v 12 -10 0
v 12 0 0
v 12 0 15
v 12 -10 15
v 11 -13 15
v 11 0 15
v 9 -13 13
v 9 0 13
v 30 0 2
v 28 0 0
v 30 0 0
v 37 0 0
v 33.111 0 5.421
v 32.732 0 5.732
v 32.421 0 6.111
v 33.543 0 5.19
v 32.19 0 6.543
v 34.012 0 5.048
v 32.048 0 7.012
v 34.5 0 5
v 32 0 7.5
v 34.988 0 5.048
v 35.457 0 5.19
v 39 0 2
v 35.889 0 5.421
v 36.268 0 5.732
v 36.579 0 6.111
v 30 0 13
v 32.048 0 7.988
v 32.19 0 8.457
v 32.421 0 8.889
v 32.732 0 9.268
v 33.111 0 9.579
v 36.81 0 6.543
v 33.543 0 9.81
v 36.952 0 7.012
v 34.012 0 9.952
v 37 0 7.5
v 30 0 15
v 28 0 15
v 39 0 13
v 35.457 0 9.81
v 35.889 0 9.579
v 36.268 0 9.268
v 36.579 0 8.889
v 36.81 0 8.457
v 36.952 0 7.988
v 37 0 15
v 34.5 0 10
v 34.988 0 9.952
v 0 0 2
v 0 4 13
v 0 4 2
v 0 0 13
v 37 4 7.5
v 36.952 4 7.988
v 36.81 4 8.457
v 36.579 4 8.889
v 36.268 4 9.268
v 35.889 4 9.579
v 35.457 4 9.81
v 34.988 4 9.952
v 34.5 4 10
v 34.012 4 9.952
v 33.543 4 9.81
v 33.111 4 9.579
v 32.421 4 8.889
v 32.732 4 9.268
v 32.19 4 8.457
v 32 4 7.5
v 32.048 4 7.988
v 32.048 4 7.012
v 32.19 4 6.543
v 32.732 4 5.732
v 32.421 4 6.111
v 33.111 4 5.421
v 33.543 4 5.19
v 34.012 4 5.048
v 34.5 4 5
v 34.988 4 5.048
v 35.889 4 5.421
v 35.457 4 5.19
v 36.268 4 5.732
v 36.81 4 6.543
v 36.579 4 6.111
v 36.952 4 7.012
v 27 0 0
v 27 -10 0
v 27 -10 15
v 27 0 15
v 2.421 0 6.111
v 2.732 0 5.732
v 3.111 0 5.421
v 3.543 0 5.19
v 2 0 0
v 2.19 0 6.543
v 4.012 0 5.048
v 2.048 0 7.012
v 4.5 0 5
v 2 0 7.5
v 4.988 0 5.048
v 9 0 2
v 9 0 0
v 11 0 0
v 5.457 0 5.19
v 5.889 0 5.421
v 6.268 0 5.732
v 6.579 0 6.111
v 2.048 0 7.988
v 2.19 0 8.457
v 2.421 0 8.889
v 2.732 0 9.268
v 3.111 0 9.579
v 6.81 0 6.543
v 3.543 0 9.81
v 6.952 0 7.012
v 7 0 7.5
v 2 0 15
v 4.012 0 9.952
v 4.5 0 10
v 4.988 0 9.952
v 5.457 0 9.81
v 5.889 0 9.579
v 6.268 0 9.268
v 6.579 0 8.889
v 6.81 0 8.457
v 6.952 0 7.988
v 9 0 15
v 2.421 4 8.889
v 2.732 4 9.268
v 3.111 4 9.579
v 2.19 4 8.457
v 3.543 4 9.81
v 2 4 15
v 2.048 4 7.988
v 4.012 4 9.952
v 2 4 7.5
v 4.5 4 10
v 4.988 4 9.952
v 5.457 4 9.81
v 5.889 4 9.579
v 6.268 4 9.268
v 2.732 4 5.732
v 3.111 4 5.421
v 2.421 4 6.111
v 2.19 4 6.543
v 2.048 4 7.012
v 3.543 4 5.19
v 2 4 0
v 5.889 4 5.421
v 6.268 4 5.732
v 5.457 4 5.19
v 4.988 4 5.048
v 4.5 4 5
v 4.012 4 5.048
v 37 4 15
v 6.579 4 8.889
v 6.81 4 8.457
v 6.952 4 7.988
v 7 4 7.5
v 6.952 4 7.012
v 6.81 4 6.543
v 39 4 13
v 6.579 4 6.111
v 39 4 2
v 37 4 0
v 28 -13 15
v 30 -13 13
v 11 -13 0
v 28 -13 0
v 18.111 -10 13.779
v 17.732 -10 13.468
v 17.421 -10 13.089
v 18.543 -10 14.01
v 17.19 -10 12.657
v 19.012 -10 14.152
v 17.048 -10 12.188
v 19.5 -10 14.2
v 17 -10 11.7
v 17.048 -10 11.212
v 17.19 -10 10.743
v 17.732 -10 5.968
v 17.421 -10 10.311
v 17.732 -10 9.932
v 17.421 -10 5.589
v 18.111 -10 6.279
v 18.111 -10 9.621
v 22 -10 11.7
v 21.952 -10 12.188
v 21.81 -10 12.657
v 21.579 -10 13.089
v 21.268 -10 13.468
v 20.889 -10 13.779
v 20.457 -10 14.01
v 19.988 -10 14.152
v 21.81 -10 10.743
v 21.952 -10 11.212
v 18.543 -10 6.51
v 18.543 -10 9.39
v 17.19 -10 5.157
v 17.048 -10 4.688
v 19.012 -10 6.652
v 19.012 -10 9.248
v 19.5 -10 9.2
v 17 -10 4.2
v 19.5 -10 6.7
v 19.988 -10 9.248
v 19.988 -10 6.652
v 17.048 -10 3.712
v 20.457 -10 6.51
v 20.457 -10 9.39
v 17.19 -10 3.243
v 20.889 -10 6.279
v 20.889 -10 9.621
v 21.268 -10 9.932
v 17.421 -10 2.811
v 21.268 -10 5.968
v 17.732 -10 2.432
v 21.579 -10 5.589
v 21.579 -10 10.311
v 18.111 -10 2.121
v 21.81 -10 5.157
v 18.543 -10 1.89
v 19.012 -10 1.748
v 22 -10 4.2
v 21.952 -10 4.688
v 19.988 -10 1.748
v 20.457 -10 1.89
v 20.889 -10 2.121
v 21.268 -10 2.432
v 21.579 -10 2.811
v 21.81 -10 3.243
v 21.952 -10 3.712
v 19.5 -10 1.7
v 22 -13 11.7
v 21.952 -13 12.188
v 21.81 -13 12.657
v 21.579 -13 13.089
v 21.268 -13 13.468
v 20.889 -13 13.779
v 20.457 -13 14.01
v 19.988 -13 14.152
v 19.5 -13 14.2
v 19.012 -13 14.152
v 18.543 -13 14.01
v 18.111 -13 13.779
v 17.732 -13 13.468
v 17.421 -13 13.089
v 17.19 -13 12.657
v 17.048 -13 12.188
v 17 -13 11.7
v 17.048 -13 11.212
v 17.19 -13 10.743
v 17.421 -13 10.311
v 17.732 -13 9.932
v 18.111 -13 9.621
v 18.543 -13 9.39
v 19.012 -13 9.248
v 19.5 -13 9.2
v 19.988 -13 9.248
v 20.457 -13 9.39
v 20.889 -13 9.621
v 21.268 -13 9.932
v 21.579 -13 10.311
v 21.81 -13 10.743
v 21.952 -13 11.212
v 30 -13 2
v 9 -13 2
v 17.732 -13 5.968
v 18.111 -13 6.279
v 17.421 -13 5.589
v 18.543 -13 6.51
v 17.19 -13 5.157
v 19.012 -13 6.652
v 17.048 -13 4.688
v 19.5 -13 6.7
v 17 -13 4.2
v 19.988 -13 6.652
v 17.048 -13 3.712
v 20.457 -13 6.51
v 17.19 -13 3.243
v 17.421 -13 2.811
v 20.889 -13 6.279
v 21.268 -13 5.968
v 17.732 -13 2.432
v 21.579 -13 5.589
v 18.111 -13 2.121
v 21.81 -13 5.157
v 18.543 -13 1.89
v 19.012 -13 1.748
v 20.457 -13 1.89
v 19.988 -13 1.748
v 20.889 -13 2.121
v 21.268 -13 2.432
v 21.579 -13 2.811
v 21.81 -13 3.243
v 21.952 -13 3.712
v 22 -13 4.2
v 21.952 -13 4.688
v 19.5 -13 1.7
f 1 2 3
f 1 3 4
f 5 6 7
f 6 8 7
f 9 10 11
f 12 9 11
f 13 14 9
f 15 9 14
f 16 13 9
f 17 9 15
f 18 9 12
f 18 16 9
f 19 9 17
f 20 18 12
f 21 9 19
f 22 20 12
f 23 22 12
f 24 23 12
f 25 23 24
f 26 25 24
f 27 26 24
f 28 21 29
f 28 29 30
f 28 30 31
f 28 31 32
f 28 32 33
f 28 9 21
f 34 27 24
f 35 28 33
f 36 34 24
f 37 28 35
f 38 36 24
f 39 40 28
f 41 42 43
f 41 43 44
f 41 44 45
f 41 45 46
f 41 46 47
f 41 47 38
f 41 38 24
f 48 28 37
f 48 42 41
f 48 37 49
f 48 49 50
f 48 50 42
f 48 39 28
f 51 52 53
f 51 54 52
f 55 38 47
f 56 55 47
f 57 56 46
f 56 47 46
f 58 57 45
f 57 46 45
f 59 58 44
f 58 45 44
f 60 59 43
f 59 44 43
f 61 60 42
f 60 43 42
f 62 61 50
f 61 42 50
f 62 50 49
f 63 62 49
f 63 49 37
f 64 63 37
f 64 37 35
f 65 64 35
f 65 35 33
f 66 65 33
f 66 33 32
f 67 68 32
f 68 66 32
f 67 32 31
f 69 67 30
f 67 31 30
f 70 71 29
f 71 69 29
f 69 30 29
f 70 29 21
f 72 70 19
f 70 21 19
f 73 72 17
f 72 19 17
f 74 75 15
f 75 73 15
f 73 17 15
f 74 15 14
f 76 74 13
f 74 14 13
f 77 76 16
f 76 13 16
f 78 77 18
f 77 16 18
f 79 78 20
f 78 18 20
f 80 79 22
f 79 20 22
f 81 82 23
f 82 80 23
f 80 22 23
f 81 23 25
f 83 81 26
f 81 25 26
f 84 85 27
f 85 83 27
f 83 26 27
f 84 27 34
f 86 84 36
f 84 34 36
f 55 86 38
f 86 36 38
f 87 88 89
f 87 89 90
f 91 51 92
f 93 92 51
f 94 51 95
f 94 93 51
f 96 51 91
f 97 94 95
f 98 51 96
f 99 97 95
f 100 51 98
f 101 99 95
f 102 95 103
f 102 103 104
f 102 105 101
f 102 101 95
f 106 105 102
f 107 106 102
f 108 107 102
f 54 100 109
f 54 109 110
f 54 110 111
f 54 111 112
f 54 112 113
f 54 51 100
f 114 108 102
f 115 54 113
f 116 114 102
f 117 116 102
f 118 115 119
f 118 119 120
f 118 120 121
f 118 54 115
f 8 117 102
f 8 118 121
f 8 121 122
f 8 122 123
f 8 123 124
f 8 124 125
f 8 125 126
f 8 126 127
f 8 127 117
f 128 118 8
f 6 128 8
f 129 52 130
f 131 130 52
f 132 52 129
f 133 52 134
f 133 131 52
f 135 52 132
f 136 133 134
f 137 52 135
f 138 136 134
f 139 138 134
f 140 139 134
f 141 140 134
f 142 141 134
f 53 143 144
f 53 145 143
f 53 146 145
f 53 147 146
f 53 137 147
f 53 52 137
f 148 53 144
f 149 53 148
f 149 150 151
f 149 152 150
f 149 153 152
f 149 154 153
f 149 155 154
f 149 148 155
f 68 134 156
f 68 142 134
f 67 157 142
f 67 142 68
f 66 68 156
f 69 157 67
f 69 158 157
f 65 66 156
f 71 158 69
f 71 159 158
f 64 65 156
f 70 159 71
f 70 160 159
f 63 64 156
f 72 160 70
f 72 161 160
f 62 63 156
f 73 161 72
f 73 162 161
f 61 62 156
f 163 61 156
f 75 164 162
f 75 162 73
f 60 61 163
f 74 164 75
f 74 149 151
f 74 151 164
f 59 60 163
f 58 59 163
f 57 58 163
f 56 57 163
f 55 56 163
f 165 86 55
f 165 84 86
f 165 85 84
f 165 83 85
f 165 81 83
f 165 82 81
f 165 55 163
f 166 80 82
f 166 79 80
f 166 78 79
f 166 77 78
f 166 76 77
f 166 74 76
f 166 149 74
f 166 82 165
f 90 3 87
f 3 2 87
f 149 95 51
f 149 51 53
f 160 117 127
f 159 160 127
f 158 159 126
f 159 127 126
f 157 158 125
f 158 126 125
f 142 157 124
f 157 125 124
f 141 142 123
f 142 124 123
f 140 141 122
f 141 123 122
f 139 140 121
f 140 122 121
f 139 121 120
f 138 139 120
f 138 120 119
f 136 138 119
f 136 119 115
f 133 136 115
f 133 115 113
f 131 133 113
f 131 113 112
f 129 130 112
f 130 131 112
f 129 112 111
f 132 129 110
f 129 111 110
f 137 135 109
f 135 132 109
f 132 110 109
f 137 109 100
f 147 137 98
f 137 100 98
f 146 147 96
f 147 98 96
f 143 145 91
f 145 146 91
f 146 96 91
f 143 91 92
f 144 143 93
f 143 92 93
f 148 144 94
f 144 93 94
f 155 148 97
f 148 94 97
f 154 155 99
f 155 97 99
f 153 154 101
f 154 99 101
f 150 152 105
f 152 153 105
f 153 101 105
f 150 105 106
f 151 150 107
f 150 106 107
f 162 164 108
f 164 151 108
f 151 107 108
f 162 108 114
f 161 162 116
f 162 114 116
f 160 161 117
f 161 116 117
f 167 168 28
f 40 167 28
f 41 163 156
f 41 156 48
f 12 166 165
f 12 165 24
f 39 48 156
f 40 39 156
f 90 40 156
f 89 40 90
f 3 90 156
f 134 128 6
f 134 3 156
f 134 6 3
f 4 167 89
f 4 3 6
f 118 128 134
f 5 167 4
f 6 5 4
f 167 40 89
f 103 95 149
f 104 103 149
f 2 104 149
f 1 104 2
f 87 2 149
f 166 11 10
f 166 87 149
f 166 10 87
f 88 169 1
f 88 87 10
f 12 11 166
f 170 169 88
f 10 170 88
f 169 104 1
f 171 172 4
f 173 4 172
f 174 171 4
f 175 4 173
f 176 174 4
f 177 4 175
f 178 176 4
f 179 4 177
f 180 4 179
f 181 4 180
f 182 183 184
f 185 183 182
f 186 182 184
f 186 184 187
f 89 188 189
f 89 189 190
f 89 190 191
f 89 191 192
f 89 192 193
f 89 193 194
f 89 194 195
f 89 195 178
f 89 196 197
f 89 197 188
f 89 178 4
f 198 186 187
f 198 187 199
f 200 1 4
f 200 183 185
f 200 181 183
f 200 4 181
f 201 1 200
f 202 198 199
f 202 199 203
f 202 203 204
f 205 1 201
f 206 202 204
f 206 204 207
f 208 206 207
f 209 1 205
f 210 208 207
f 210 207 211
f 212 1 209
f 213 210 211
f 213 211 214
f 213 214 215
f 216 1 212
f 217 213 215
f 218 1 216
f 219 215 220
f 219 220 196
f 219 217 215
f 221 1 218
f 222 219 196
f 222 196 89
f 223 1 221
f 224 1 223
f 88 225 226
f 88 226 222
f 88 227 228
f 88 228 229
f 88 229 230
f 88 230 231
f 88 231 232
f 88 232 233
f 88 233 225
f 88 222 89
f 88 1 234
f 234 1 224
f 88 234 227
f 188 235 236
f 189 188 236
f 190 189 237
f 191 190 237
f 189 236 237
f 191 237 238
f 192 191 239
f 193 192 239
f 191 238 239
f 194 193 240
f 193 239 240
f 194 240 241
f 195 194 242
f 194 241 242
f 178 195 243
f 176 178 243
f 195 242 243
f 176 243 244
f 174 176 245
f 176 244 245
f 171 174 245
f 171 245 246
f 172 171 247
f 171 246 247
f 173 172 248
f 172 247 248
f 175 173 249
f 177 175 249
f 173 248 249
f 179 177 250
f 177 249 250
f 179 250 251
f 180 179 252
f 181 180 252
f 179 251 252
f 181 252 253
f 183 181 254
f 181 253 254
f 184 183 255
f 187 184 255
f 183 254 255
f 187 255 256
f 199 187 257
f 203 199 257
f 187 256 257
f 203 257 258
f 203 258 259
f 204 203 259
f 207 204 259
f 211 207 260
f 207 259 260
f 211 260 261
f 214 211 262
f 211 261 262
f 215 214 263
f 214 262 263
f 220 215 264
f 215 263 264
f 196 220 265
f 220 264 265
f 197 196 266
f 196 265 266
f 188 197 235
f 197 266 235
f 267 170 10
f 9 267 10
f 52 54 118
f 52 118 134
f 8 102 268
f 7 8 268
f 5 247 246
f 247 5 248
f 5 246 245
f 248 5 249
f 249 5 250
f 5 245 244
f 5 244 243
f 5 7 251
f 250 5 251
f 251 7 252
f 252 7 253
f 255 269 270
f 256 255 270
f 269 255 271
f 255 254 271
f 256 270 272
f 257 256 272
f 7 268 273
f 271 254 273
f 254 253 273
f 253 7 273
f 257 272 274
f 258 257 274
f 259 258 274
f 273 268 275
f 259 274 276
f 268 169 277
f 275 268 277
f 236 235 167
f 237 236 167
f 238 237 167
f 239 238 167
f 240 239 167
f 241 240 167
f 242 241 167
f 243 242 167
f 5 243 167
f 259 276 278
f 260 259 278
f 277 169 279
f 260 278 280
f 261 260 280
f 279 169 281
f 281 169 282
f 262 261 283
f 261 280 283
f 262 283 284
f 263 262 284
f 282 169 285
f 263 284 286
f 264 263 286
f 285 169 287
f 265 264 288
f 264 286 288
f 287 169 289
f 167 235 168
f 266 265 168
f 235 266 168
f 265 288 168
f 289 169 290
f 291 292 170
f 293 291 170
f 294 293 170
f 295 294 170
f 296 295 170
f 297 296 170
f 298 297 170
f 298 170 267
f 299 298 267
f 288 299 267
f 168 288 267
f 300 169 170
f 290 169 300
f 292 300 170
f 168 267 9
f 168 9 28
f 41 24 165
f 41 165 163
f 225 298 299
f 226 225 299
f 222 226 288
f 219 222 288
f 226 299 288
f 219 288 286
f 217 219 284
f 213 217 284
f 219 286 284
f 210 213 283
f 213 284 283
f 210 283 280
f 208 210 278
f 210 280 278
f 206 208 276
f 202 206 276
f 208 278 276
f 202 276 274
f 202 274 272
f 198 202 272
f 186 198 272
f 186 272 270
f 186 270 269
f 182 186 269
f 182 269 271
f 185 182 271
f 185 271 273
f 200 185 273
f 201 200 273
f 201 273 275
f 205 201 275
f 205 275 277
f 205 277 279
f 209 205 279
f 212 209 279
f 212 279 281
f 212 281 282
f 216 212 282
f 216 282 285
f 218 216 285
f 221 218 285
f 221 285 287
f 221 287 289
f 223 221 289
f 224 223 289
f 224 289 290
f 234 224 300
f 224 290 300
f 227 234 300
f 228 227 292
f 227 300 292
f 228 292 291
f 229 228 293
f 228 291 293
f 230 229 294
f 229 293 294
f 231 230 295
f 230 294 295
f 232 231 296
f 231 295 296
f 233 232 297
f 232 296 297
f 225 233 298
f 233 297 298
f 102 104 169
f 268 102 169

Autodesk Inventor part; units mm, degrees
ref_plane "YZ Plane" through (0, 0, 0) normal (1, 0, 0) x (0, 1, 0)
ref_plane "XZ Plane" through (0, 0, 0) normal (0, 1, 0) x (-1, 0, 0)
ref_plane "XY Plane" through (0, 0, 0) normal (0, 0, 1) x (1, 0, 0)
sketch "Sketch4" plane through (0, 0, 0) normal (0, 0, 1) x (1, 0, 0)
  line L0 (0, 0) -> (12, 0)
  line L1 (12, 0) -> (12, -10)
  line L2 (12, -10) -> (27, -10)
  line L3 (27, -10) -> (27, 0)
  line L4 (27, 0) -> (39, 0)
  line L5 (0, -3) -> (9, -3)
  line L6 (9, -3) -> (9, -13)
  line L7 (9, -13) -> (30, -13)
  line L8 (30, -13) -> (30, -3)
  line L9 (30, -3) -> (39, -3)
  line L10 (0, -3) -> (0, 0)
  line L11 (39, -3) -> (39, 0)
  dimension "d14" = 12
  dimension "d15" = 12
  dimension "d16" = 10
  dimension "d17" = 15
  dimension "d18" = 3
extrude "Extrusion4" add sketch "Sketch4" along normal blind 30
sketch "Sketch5" plane through (0, 0, 0) normal (0, 1, 0) x (1, 0, 0)
  line L0 (9, 0) -> (0, 0) construction
  line L1 (9, 0) -> (9, -30) construction
  line L2 (0, -30) -> (9, -30) construction
  line L3 (0, 0) -> (0, -30) construction
  line L4 (39, 0) -> (30, 0) construction
  line L5 (39, 0) -> (39, -30) construction
  line L6 (30, -30) -> (39, -30) construction
  line L7 (30, 0) -> (30, -30) construction
  circle A0 centre (4.5, -22.5) radius 2.5
  circle A1 centre (4.5, -7.5) radius 2.5
  line L8 (4.5, -22.5) -> (4.5, -7.5) construction
  line L9 (19.5, -30) -> (19.5, 0)
  line L10 (12, 0) -> (27, 0) projected
  line L11 (27, -30) -> (12, -30) projected
  circle A2 centre (34.5, -22.5) radius 2.5
  circle A3 centre (34.5, -7.5) radius 2.5
  line L12 (34.5, -22.5) -> (34.5, -7.5) construction
  point P0 (4.5, -30)
  point P1 (4.5, 0)
  point P2 (4.5, -15)
  point P3 (0, -15)
  point P4 (34.5, -15)
  dimension "d21" = 5
  dimension "d22" = 5
  dimension "d23" = 15
extrude "Extrusion5" cut sketch "Sketch5" against normal through all
sketch "Sketch6" plane through (9, -13, 0) normal (0, -1, 0) x (1, 0, 0)
  line L0 (3, 30) -> (-9, 30) projected
  line L1 (30, 0) -> (30, 30) projected
  line L2 (-9, 30) -> (30, 30)
  line L3 (30, 30) -> (30, 15)
  line L4 (30, 15) -> (-9, 15)
  line L5 (-9, 15) -> (-9, 30)
  point P0 (-9, 0)
extrude "Extrusion6" cut sketch "Sketch6" against normal through all
sketch "Sketch7" plane through (9, -13, 0) normal (0, -1, 0) x (1, 0, 0)
  circle A0 centre (10.5, 11.7) radius 2.5
  circle A1 centre (10.5, 4.2) radius 2.5
  line L0 (10.5, 4.2) -> (10.5, 11.7) construction
  line L1 (21, 15) -> (0, 15) projected
  point P0 (-9, 0)
  point P1 (10.5, 15)
  dimension "d28" = 5
  dimension "d29" = 5
  dimension "d30" = 7.5
  dimension "d31" = 3.3
extrude "Extrusion7" cut sketch "Sketch7" against normal through all
sketch "Sketch8" plane through (0, 0, 0) normal (0, 1, 0) x (1, 0, 0)
  line L0 (27, -15) -> (39, -15) projected
  line L1 (0, 0) -> (39, 0)
  line L2 (39, 0) -> (39, -15)
  line L3 (39, -15) -> (0, -15)
  line L4 (0, -15) -> (0, 0)
  circle A0 centre (4.5, -7.5) radius 2.5 projected
  circle A1 centre (34.5, -7.5) radius 2.5 projected
extrude "Extrusion8" add sketch "Sketch8" along normal blind 4
sketch "Sketch9" plane through (0, 0, 0) normal (0, -1, 0) x (1, 0, 0)
  line L0 (9, 15) -> (0, 15) projected
  line L1 (0, 0) -> (0, 15) projected
  line L2 (9, 0) -> (0, 0) projected
  line L3 (9, 0) -> (9, 15) projected
  circle A0 centre (4.5, 7.5) radius 2.5 projected
  line L4 (39, 15) -> (30, 15) projected
  line L5 (30, 0) -> (30, 15) projected
  line L6 (39, 0) -> (30, 0) projected
  line L7 (39, 0) -> (39, 15) projected
  circle A1 centre (34.5, 7.5) radius 2.5 projected
extrude "Extrusion9" cut sketch "Sketch9" along normal through all
chamfer "Chamfer1" distance 2 angle 45 4 edges at (9, -6.5, 15) (30, -6.5, 15) (30, -6.5, 0) (9, -6.5, 0)
chamfer "Chamfer2" distance 2 angle 45 4 edges at (39, 2, 15) (39, 2, 0) (0, 2, 0) (0, 2, 15)
equation "\"d15\" = d14"
properties part number "WA03" material "ABS Plastic"
